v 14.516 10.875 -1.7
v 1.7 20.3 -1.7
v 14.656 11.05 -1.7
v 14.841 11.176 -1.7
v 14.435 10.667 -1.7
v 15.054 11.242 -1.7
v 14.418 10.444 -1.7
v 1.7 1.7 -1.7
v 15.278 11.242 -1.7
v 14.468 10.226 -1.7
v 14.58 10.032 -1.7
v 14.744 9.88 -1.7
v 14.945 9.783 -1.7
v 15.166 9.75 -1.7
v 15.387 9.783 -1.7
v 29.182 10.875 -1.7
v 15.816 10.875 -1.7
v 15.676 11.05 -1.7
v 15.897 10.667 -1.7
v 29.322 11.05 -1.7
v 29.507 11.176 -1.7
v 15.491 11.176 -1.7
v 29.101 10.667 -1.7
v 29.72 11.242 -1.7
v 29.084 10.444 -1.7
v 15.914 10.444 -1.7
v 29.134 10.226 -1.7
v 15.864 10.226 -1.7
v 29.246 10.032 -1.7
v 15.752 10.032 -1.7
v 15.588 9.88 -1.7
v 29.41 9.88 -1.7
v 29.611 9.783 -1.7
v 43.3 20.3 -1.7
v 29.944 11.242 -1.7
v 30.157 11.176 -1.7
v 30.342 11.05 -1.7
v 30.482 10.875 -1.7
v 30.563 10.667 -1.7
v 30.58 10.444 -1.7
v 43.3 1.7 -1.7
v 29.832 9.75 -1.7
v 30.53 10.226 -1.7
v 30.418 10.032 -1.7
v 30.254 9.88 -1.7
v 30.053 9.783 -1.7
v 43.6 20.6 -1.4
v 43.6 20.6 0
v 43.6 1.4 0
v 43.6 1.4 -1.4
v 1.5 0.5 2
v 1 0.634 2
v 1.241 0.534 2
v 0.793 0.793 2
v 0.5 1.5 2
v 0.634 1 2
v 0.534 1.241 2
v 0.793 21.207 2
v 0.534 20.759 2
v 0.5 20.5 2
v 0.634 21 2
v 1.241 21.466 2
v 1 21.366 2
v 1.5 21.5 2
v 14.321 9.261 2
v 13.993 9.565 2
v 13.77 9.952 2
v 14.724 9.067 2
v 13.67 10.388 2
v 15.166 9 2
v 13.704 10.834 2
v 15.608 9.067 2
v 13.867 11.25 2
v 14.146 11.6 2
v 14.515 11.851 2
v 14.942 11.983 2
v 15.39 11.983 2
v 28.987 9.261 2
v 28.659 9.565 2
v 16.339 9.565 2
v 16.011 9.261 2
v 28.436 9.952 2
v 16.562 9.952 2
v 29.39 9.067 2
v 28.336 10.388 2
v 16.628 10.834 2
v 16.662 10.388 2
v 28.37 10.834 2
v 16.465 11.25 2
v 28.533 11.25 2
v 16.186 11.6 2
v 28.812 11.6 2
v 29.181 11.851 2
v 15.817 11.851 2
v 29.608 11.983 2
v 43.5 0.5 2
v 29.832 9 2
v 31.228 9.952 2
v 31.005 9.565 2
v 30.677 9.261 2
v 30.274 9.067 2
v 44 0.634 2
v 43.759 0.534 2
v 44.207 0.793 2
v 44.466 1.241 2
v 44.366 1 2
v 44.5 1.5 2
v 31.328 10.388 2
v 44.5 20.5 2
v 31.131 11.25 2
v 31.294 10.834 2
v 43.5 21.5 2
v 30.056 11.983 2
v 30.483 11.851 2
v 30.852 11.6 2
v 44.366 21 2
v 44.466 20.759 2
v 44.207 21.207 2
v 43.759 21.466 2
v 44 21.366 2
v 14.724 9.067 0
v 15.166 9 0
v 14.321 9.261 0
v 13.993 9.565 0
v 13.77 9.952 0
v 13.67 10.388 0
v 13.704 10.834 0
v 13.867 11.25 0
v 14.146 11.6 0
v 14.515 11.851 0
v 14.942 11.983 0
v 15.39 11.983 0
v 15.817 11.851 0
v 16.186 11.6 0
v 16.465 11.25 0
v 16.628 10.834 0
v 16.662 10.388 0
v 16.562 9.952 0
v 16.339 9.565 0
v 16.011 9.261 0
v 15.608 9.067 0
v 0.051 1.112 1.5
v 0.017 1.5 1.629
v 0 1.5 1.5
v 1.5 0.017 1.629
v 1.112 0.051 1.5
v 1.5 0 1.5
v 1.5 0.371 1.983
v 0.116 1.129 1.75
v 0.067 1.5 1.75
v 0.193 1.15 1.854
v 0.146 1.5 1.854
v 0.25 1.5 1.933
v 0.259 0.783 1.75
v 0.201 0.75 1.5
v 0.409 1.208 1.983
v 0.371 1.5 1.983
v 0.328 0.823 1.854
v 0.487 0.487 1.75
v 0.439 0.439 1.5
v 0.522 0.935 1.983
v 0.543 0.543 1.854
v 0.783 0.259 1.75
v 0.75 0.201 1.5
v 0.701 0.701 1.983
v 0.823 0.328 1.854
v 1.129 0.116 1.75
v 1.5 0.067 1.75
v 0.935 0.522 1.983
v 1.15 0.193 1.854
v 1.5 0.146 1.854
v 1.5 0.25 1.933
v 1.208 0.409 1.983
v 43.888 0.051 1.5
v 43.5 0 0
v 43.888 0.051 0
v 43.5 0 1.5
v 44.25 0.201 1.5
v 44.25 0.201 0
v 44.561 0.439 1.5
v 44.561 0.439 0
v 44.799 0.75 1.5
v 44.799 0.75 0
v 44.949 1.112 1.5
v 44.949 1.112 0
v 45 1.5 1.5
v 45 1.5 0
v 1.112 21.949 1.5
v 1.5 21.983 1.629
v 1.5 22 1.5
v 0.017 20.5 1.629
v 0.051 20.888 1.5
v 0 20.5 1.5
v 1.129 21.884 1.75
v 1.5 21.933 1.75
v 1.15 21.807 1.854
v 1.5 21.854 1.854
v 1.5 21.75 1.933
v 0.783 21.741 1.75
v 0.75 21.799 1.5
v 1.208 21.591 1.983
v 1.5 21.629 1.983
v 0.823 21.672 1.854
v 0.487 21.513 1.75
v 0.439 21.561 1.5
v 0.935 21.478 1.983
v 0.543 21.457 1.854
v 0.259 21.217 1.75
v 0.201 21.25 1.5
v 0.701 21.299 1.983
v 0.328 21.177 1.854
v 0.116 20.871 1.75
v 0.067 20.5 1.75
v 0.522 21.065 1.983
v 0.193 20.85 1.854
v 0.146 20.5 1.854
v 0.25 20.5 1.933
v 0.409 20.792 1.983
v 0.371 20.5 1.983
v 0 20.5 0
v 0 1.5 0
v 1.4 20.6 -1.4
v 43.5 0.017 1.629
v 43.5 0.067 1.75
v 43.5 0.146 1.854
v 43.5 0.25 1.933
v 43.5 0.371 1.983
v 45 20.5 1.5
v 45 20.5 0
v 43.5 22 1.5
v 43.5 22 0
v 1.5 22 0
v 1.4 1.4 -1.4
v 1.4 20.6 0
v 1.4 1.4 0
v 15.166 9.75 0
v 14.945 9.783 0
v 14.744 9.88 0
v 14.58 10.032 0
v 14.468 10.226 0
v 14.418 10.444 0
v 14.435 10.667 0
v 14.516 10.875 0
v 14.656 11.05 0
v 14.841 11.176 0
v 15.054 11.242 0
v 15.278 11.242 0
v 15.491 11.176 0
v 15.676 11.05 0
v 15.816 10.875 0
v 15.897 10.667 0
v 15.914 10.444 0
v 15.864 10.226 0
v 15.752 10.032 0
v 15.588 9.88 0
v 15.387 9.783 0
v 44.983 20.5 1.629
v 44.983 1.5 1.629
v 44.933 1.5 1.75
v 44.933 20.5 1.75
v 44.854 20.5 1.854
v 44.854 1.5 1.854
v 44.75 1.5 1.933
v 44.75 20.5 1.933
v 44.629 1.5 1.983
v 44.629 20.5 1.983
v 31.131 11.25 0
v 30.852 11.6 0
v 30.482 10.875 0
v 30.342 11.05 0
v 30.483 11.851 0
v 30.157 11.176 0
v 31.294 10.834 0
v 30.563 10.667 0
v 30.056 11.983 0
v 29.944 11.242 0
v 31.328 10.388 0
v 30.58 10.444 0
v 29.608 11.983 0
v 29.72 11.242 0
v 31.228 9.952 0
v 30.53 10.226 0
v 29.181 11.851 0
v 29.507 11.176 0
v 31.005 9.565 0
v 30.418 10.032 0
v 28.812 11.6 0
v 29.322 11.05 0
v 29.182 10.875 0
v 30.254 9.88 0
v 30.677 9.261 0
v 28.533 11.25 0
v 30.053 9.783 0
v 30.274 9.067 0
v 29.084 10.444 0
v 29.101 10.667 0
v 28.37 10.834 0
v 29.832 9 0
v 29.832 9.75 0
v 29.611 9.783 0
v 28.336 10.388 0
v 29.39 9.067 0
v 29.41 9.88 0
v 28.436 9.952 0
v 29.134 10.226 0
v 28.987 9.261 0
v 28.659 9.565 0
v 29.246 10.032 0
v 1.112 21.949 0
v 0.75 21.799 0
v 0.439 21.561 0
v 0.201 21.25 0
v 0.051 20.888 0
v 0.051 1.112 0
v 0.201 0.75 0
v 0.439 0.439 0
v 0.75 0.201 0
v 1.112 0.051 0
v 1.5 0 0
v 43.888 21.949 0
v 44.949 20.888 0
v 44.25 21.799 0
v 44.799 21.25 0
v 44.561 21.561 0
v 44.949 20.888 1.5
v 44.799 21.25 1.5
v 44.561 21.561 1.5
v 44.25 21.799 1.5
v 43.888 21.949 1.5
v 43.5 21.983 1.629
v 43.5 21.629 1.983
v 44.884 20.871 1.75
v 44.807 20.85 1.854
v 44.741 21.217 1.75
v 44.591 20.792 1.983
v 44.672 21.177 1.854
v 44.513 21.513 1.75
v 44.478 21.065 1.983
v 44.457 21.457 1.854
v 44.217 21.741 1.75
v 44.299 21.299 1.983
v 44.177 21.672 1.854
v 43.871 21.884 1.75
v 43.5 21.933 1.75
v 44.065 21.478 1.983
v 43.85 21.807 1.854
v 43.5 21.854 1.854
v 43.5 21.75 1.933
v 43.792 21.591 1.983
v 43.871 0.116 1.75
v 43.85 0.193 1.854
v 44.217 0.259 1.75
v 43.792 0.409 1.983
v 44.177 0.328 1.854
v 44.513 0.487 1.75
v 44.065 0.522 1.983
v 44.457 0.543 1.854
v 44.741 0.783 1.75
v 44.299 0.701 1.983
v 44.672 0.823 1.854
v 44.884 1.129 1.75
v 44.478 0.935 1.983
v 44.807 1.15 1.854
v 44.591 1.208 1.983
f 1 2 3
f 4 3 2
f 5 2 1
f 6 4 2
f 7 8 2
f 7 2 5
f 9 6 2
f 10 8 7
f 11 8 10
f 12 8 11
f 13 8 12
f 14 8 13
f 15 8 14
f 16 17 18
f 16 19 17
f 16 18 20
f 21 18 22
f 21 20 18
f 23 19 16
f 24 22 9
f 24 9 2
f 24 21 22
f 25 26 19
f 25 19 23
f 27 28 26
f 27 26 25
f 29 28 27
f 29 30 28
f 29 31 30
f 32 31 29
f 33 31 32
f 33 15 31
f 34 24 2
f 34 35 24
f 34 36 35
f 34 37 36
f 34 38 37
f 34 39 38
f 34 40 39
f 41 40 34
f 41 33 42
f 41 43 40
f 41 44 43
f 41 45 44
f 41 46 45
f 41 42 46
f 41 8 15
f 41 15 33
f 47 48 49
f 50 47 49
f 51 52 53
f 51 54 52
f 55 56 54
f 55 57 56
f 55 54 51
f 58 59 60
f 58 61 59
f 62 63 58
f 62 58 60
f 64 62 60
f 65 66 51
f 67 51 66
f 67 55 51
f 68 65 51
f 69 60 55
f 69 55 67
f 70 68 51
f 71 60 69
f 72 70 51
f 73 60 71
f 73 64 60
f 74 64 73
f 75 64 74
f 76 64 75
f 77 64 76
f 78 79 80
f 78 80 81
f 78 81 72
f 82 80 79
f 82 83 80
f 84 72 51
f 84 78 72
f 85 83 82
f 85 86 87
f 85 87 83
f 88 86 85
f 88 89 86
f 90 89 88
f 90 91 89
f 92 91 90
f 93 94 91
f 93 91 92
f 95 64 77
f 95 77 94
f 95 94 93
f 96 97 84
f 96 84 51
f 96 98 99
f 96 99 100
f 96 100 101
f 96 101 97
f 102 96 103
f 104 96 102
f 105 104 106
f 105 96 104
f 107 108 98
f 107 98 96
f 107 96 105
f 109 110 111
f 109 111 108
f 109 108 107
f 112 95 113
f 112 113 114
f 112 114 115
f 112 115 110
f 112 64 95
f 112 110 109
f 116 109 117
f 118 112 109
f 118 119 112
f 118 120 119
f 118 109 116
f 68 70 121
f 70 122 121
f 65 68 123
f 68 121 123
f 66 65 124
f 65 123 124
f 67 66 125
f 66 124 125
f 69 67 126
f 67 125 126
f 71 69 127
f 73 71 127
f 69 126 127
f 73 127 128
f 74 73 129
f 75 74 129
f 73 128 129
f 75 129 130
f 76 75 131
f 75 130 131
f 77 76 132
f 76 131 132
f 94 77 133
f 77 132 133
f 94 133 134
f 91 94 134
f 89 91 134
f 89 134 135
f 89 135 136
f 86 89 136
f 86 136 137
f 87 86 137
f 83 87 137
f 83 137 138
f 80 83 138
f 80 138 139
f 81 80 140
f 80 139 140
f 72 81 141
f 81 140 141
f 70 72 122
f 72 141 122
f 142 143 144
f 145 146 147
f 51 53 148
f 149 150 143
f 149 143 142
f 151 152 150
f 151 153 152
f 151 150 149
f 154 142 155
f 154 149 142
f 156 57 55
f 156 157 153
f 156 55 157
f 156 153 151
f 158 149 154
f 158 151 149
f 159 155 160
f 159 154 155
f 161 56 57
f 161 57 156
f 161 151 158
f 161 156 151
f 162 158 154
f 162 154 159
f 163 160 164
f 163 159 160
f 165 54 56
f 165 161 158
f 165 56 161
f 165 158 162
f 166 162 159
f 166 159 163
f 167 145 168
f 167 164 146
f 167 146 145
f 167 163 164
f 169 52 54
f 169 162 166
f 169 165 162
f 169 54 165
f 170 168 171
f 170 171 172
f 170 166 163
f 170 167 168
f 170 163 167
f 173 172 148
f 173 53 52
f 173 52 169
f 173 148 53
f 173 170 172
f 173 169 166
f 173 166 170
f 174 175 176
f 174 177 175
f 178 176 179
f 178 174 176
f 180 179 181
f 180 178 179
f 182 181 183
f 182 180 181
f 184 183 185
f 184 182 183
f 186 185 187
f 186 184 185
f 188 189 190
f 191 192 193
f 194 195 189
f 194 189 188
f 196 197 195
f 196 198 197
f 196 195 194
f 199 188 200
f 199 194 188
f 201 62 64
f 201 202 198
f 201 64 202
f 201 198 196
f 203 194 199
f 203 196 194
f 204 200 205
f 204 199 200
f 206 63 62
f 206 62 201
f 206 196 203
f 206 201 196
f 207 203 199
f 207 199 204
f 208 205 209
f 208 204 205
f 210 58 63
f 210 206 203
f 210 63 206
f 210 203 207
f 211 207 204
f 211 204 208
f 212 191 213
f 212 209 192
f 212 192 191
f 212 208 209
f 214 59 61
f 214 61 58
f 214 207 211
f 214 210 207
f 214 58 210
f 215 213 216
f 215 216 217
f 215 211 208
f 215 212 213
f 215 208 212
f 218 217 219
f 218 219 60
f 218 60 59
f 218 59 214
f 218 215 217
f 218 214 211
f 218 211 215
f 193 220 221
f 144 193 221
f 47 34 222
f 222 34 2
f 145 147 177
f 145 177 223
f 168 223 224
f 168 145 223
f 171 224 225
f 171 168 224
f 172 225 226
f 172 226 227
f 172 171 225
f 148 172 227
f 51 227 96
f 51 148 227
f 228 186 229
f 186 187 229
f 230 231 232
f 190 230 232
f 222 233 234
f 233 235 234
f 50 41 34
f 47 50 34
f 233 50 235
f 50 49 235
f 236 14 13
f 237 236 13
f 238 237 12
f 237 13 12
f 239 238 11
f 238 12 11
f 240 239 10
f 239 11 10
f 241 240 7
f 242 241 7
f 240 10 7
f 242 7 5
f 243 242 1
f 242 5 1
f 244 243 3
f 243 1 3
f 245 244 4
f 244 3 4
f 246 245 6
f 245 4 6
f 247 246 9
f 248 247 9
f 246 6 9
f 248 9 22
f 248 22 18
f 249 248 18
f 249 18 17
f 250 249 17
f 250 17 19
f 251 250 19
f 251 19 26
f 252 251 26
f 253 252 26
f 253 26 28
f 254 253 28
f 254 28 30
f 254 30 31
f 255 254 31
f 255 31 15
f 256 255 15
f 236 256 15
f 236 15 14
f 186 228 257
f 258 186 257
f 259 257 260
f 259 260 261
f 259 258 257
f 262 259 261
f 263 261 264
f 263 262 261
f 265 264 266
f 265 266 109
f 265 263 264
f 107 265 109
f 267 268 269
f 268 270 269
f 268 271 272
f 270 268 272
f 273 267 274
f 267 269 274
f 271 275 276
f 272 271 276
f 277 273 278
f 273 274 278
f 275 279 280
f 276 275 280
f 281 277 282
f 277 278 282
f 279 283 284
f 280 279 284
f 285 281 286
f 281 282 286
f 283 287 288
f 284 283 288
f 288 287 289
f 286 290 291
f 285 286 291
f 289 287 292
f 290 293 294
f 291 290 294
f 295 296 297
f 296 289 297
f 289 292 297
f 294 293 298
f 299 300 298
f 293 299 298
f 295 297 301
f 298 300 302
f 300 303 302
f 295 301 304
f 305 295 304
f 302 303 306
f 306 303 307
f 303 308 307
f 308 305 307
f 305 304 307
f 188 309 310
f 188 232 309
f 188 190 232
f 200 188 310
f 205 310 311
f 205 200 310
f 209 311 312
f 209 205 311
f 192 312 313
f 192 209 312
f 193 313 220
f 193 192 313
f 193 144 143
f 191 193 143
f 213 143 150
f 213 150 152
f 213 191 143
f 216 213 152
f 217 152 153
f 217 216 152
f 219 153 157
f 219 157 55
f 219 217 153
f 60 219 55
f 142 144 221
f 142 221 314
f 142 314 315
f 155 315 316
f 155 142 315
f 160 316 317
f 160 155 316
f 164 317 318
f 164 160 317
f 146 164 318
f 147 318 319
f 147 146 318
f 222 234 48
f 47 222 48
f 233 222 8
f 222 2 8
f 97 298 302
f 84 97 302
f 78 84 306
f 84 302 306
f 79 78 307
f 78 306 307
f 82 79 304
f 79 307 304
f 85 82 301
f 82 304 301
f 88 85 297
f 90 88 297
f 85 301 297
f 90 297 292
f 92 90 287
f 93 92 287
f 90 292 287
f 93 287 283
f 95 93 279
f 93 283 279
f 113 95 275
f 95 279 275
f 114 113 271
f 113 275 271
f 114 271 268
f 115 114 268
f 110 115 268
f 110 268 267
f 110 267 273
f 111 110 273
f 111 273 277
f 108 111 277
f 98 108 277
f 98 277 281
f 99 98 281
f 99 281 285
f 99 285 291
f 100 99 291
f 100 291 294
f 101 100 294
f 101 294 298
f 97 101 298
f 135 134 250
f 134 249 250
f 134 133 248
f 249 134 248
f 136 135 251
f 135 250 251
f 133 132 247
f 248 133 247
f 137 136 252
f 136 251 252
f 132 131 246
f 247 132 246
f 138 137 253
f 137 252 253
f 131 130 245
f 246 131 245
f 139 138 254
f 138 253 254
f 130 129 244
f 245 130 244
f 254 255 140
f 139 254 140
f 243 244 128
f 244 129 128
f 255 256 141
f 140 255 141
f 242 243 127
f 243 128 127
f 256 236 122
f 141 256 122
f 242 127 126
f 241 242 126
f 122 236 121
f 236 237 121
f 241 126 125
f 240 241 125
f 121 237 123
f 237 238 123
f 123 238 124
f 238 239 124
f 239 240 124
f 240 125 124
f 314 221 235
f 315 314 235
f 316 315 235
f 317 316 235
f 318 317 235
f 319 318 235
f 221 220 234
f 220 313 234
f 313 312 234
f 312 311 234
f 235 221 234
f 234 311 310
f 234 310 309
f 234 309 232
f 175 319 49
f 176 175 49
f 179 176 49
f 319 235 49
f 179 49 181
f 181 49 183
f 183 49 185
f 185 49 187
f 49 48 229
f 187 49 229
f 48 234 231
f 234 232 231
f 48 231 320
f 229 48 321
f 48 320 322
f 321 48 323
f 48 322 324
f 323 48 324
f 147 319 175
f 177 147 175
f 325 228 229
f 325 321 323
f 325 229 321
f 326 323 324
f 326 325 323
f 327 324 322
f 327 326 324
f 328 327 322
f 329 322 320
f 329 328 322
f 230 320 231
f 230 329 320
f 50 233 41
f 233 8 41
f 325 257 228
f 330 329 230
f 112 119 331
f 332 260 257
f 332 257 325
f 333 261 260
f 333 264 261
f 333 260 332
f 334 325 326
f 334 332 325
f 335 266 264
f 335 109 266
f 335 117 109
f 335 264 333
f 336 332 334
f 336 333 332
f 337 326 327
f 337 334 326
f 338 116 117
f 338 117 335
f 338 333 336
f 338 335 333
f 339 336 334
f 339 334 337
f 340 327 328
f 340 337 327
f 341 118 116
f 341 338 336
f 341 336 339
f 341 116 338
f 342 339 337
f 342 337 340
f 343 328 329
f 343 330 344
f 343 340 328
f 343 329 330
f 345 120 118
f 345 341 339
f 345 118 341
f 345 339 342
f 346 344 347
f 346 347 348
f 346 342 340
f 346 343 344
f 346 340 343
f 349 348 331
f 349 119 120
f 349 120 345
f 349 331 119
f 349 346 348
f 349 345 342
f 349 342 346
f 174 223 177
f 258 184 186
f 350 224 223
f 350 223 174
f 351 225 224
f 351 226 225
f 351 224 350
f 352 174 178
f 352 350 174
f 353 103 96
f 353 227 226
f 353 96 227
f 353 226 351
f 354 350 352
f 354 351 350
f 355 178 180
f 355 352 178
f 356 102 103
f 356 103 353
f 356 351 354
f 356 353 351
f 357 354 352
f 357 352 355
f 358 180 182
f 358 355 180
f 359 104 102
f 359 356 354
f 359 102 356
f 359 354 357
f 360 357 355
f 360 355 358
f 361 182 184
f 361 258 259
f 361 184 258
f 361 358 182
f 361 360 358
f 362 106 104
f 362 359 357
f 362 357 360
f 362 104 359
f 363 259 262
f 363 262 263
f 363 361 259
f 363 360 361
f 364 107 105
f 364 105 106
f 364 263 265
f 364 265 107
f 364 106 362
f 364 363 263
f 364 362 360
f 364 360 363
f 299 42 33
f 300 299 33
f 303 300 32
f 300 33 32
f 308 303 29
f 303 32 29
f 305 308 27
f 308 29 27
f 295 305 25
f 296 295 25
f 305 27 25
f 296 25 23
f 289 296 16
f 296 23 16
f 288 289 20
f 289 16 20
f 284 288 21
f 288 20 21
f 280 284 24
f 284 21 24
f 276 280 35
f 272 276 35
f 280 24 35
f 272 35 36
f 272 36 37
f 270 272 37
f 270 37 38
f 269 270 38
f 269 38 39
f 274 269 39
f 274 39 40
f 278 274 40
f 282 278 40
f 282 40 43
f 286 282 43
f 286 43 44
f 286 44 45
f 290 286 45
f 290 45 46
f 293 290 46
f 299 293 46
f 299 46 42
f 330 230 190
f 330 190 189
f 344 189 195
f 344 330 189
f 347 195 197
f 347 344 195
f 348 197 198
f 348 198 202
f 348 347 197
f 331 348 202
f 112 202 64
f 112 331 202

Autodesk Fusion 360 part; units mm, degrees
sketch "Esquisse1" plane through (0, 0, 0) normal (0, 0, 1) x (1, 0, 0)
  line L0 (0, 0) -> (45, 0)
  line L1 (45, 0) -> (45, 22)
  line L2 (45, 22) -> (0, 22)
  line L3 (0, 22) -> (0, 0)
  dimension "d1" = 45
  dimension "d2" = 22
extrude "Extrusion1" add sketch "Esquisse1" along normal blind 2
sketch "Esquisse2" plane through (0, 0, 0) normal (0, 0, -1) x (1, 0, 0)
  line L0 (0, 0) -> (0, -22)
  line L1 (0, -22) -> (45, -22)
  line L2 (45, -22) -> (45, 0)
  line L3 (45, 0) -> (0, 0)
  line L4 (1.4, -20.6) -> (43.6, -20.6)
  line L5 (43.6, -20.6) -> (43.6, -1.4)
  line L6 (43.6, -1.4) -> (1.4, -1.4)
  line L7 (1.4, -1.4) -> (1.4, -20.6)
  dimension "d5" = -1.4
extrude "Extrusion2" add sketch "Esquisse2" along normal blind 1.7 contours L4 L5 L6 L7
fillet "Congé1" radius 1.5 4 edges at (0, 0, 1) (45, 0, 1) (45, 22, 1) (0, 22, 1)
chamfer "Chanfrein1" distance 0.3 angle 45 4 edges at (22.5, 20.6, -1.7) (1.4, 11, -1.7) (22.5, 1.4, -1.7) (43.6, 11, -1.7)
fillet "Congé2" radius 0.5 8 edges at (0.4393, 21.5607, 2) (0, 11, 2) (0.4393, 0.4393, 2) (22.5, 0, 2) (44.5607, 0.4393, 2) (45, 11, 2) (44.5607, 21.5607, 2) (22.5, 22, 2)
hole "Perçage1" at (15.166, 10.5, 2) direction (0, 0, -1) diameter 1.5 depth 9 tip angle 180 counterbore diameter 3 counterbore depth 2
pattern_linear "Réseau R1" count 2 spacing 14.666 along (1, 0, 0) of "Perçage1"
